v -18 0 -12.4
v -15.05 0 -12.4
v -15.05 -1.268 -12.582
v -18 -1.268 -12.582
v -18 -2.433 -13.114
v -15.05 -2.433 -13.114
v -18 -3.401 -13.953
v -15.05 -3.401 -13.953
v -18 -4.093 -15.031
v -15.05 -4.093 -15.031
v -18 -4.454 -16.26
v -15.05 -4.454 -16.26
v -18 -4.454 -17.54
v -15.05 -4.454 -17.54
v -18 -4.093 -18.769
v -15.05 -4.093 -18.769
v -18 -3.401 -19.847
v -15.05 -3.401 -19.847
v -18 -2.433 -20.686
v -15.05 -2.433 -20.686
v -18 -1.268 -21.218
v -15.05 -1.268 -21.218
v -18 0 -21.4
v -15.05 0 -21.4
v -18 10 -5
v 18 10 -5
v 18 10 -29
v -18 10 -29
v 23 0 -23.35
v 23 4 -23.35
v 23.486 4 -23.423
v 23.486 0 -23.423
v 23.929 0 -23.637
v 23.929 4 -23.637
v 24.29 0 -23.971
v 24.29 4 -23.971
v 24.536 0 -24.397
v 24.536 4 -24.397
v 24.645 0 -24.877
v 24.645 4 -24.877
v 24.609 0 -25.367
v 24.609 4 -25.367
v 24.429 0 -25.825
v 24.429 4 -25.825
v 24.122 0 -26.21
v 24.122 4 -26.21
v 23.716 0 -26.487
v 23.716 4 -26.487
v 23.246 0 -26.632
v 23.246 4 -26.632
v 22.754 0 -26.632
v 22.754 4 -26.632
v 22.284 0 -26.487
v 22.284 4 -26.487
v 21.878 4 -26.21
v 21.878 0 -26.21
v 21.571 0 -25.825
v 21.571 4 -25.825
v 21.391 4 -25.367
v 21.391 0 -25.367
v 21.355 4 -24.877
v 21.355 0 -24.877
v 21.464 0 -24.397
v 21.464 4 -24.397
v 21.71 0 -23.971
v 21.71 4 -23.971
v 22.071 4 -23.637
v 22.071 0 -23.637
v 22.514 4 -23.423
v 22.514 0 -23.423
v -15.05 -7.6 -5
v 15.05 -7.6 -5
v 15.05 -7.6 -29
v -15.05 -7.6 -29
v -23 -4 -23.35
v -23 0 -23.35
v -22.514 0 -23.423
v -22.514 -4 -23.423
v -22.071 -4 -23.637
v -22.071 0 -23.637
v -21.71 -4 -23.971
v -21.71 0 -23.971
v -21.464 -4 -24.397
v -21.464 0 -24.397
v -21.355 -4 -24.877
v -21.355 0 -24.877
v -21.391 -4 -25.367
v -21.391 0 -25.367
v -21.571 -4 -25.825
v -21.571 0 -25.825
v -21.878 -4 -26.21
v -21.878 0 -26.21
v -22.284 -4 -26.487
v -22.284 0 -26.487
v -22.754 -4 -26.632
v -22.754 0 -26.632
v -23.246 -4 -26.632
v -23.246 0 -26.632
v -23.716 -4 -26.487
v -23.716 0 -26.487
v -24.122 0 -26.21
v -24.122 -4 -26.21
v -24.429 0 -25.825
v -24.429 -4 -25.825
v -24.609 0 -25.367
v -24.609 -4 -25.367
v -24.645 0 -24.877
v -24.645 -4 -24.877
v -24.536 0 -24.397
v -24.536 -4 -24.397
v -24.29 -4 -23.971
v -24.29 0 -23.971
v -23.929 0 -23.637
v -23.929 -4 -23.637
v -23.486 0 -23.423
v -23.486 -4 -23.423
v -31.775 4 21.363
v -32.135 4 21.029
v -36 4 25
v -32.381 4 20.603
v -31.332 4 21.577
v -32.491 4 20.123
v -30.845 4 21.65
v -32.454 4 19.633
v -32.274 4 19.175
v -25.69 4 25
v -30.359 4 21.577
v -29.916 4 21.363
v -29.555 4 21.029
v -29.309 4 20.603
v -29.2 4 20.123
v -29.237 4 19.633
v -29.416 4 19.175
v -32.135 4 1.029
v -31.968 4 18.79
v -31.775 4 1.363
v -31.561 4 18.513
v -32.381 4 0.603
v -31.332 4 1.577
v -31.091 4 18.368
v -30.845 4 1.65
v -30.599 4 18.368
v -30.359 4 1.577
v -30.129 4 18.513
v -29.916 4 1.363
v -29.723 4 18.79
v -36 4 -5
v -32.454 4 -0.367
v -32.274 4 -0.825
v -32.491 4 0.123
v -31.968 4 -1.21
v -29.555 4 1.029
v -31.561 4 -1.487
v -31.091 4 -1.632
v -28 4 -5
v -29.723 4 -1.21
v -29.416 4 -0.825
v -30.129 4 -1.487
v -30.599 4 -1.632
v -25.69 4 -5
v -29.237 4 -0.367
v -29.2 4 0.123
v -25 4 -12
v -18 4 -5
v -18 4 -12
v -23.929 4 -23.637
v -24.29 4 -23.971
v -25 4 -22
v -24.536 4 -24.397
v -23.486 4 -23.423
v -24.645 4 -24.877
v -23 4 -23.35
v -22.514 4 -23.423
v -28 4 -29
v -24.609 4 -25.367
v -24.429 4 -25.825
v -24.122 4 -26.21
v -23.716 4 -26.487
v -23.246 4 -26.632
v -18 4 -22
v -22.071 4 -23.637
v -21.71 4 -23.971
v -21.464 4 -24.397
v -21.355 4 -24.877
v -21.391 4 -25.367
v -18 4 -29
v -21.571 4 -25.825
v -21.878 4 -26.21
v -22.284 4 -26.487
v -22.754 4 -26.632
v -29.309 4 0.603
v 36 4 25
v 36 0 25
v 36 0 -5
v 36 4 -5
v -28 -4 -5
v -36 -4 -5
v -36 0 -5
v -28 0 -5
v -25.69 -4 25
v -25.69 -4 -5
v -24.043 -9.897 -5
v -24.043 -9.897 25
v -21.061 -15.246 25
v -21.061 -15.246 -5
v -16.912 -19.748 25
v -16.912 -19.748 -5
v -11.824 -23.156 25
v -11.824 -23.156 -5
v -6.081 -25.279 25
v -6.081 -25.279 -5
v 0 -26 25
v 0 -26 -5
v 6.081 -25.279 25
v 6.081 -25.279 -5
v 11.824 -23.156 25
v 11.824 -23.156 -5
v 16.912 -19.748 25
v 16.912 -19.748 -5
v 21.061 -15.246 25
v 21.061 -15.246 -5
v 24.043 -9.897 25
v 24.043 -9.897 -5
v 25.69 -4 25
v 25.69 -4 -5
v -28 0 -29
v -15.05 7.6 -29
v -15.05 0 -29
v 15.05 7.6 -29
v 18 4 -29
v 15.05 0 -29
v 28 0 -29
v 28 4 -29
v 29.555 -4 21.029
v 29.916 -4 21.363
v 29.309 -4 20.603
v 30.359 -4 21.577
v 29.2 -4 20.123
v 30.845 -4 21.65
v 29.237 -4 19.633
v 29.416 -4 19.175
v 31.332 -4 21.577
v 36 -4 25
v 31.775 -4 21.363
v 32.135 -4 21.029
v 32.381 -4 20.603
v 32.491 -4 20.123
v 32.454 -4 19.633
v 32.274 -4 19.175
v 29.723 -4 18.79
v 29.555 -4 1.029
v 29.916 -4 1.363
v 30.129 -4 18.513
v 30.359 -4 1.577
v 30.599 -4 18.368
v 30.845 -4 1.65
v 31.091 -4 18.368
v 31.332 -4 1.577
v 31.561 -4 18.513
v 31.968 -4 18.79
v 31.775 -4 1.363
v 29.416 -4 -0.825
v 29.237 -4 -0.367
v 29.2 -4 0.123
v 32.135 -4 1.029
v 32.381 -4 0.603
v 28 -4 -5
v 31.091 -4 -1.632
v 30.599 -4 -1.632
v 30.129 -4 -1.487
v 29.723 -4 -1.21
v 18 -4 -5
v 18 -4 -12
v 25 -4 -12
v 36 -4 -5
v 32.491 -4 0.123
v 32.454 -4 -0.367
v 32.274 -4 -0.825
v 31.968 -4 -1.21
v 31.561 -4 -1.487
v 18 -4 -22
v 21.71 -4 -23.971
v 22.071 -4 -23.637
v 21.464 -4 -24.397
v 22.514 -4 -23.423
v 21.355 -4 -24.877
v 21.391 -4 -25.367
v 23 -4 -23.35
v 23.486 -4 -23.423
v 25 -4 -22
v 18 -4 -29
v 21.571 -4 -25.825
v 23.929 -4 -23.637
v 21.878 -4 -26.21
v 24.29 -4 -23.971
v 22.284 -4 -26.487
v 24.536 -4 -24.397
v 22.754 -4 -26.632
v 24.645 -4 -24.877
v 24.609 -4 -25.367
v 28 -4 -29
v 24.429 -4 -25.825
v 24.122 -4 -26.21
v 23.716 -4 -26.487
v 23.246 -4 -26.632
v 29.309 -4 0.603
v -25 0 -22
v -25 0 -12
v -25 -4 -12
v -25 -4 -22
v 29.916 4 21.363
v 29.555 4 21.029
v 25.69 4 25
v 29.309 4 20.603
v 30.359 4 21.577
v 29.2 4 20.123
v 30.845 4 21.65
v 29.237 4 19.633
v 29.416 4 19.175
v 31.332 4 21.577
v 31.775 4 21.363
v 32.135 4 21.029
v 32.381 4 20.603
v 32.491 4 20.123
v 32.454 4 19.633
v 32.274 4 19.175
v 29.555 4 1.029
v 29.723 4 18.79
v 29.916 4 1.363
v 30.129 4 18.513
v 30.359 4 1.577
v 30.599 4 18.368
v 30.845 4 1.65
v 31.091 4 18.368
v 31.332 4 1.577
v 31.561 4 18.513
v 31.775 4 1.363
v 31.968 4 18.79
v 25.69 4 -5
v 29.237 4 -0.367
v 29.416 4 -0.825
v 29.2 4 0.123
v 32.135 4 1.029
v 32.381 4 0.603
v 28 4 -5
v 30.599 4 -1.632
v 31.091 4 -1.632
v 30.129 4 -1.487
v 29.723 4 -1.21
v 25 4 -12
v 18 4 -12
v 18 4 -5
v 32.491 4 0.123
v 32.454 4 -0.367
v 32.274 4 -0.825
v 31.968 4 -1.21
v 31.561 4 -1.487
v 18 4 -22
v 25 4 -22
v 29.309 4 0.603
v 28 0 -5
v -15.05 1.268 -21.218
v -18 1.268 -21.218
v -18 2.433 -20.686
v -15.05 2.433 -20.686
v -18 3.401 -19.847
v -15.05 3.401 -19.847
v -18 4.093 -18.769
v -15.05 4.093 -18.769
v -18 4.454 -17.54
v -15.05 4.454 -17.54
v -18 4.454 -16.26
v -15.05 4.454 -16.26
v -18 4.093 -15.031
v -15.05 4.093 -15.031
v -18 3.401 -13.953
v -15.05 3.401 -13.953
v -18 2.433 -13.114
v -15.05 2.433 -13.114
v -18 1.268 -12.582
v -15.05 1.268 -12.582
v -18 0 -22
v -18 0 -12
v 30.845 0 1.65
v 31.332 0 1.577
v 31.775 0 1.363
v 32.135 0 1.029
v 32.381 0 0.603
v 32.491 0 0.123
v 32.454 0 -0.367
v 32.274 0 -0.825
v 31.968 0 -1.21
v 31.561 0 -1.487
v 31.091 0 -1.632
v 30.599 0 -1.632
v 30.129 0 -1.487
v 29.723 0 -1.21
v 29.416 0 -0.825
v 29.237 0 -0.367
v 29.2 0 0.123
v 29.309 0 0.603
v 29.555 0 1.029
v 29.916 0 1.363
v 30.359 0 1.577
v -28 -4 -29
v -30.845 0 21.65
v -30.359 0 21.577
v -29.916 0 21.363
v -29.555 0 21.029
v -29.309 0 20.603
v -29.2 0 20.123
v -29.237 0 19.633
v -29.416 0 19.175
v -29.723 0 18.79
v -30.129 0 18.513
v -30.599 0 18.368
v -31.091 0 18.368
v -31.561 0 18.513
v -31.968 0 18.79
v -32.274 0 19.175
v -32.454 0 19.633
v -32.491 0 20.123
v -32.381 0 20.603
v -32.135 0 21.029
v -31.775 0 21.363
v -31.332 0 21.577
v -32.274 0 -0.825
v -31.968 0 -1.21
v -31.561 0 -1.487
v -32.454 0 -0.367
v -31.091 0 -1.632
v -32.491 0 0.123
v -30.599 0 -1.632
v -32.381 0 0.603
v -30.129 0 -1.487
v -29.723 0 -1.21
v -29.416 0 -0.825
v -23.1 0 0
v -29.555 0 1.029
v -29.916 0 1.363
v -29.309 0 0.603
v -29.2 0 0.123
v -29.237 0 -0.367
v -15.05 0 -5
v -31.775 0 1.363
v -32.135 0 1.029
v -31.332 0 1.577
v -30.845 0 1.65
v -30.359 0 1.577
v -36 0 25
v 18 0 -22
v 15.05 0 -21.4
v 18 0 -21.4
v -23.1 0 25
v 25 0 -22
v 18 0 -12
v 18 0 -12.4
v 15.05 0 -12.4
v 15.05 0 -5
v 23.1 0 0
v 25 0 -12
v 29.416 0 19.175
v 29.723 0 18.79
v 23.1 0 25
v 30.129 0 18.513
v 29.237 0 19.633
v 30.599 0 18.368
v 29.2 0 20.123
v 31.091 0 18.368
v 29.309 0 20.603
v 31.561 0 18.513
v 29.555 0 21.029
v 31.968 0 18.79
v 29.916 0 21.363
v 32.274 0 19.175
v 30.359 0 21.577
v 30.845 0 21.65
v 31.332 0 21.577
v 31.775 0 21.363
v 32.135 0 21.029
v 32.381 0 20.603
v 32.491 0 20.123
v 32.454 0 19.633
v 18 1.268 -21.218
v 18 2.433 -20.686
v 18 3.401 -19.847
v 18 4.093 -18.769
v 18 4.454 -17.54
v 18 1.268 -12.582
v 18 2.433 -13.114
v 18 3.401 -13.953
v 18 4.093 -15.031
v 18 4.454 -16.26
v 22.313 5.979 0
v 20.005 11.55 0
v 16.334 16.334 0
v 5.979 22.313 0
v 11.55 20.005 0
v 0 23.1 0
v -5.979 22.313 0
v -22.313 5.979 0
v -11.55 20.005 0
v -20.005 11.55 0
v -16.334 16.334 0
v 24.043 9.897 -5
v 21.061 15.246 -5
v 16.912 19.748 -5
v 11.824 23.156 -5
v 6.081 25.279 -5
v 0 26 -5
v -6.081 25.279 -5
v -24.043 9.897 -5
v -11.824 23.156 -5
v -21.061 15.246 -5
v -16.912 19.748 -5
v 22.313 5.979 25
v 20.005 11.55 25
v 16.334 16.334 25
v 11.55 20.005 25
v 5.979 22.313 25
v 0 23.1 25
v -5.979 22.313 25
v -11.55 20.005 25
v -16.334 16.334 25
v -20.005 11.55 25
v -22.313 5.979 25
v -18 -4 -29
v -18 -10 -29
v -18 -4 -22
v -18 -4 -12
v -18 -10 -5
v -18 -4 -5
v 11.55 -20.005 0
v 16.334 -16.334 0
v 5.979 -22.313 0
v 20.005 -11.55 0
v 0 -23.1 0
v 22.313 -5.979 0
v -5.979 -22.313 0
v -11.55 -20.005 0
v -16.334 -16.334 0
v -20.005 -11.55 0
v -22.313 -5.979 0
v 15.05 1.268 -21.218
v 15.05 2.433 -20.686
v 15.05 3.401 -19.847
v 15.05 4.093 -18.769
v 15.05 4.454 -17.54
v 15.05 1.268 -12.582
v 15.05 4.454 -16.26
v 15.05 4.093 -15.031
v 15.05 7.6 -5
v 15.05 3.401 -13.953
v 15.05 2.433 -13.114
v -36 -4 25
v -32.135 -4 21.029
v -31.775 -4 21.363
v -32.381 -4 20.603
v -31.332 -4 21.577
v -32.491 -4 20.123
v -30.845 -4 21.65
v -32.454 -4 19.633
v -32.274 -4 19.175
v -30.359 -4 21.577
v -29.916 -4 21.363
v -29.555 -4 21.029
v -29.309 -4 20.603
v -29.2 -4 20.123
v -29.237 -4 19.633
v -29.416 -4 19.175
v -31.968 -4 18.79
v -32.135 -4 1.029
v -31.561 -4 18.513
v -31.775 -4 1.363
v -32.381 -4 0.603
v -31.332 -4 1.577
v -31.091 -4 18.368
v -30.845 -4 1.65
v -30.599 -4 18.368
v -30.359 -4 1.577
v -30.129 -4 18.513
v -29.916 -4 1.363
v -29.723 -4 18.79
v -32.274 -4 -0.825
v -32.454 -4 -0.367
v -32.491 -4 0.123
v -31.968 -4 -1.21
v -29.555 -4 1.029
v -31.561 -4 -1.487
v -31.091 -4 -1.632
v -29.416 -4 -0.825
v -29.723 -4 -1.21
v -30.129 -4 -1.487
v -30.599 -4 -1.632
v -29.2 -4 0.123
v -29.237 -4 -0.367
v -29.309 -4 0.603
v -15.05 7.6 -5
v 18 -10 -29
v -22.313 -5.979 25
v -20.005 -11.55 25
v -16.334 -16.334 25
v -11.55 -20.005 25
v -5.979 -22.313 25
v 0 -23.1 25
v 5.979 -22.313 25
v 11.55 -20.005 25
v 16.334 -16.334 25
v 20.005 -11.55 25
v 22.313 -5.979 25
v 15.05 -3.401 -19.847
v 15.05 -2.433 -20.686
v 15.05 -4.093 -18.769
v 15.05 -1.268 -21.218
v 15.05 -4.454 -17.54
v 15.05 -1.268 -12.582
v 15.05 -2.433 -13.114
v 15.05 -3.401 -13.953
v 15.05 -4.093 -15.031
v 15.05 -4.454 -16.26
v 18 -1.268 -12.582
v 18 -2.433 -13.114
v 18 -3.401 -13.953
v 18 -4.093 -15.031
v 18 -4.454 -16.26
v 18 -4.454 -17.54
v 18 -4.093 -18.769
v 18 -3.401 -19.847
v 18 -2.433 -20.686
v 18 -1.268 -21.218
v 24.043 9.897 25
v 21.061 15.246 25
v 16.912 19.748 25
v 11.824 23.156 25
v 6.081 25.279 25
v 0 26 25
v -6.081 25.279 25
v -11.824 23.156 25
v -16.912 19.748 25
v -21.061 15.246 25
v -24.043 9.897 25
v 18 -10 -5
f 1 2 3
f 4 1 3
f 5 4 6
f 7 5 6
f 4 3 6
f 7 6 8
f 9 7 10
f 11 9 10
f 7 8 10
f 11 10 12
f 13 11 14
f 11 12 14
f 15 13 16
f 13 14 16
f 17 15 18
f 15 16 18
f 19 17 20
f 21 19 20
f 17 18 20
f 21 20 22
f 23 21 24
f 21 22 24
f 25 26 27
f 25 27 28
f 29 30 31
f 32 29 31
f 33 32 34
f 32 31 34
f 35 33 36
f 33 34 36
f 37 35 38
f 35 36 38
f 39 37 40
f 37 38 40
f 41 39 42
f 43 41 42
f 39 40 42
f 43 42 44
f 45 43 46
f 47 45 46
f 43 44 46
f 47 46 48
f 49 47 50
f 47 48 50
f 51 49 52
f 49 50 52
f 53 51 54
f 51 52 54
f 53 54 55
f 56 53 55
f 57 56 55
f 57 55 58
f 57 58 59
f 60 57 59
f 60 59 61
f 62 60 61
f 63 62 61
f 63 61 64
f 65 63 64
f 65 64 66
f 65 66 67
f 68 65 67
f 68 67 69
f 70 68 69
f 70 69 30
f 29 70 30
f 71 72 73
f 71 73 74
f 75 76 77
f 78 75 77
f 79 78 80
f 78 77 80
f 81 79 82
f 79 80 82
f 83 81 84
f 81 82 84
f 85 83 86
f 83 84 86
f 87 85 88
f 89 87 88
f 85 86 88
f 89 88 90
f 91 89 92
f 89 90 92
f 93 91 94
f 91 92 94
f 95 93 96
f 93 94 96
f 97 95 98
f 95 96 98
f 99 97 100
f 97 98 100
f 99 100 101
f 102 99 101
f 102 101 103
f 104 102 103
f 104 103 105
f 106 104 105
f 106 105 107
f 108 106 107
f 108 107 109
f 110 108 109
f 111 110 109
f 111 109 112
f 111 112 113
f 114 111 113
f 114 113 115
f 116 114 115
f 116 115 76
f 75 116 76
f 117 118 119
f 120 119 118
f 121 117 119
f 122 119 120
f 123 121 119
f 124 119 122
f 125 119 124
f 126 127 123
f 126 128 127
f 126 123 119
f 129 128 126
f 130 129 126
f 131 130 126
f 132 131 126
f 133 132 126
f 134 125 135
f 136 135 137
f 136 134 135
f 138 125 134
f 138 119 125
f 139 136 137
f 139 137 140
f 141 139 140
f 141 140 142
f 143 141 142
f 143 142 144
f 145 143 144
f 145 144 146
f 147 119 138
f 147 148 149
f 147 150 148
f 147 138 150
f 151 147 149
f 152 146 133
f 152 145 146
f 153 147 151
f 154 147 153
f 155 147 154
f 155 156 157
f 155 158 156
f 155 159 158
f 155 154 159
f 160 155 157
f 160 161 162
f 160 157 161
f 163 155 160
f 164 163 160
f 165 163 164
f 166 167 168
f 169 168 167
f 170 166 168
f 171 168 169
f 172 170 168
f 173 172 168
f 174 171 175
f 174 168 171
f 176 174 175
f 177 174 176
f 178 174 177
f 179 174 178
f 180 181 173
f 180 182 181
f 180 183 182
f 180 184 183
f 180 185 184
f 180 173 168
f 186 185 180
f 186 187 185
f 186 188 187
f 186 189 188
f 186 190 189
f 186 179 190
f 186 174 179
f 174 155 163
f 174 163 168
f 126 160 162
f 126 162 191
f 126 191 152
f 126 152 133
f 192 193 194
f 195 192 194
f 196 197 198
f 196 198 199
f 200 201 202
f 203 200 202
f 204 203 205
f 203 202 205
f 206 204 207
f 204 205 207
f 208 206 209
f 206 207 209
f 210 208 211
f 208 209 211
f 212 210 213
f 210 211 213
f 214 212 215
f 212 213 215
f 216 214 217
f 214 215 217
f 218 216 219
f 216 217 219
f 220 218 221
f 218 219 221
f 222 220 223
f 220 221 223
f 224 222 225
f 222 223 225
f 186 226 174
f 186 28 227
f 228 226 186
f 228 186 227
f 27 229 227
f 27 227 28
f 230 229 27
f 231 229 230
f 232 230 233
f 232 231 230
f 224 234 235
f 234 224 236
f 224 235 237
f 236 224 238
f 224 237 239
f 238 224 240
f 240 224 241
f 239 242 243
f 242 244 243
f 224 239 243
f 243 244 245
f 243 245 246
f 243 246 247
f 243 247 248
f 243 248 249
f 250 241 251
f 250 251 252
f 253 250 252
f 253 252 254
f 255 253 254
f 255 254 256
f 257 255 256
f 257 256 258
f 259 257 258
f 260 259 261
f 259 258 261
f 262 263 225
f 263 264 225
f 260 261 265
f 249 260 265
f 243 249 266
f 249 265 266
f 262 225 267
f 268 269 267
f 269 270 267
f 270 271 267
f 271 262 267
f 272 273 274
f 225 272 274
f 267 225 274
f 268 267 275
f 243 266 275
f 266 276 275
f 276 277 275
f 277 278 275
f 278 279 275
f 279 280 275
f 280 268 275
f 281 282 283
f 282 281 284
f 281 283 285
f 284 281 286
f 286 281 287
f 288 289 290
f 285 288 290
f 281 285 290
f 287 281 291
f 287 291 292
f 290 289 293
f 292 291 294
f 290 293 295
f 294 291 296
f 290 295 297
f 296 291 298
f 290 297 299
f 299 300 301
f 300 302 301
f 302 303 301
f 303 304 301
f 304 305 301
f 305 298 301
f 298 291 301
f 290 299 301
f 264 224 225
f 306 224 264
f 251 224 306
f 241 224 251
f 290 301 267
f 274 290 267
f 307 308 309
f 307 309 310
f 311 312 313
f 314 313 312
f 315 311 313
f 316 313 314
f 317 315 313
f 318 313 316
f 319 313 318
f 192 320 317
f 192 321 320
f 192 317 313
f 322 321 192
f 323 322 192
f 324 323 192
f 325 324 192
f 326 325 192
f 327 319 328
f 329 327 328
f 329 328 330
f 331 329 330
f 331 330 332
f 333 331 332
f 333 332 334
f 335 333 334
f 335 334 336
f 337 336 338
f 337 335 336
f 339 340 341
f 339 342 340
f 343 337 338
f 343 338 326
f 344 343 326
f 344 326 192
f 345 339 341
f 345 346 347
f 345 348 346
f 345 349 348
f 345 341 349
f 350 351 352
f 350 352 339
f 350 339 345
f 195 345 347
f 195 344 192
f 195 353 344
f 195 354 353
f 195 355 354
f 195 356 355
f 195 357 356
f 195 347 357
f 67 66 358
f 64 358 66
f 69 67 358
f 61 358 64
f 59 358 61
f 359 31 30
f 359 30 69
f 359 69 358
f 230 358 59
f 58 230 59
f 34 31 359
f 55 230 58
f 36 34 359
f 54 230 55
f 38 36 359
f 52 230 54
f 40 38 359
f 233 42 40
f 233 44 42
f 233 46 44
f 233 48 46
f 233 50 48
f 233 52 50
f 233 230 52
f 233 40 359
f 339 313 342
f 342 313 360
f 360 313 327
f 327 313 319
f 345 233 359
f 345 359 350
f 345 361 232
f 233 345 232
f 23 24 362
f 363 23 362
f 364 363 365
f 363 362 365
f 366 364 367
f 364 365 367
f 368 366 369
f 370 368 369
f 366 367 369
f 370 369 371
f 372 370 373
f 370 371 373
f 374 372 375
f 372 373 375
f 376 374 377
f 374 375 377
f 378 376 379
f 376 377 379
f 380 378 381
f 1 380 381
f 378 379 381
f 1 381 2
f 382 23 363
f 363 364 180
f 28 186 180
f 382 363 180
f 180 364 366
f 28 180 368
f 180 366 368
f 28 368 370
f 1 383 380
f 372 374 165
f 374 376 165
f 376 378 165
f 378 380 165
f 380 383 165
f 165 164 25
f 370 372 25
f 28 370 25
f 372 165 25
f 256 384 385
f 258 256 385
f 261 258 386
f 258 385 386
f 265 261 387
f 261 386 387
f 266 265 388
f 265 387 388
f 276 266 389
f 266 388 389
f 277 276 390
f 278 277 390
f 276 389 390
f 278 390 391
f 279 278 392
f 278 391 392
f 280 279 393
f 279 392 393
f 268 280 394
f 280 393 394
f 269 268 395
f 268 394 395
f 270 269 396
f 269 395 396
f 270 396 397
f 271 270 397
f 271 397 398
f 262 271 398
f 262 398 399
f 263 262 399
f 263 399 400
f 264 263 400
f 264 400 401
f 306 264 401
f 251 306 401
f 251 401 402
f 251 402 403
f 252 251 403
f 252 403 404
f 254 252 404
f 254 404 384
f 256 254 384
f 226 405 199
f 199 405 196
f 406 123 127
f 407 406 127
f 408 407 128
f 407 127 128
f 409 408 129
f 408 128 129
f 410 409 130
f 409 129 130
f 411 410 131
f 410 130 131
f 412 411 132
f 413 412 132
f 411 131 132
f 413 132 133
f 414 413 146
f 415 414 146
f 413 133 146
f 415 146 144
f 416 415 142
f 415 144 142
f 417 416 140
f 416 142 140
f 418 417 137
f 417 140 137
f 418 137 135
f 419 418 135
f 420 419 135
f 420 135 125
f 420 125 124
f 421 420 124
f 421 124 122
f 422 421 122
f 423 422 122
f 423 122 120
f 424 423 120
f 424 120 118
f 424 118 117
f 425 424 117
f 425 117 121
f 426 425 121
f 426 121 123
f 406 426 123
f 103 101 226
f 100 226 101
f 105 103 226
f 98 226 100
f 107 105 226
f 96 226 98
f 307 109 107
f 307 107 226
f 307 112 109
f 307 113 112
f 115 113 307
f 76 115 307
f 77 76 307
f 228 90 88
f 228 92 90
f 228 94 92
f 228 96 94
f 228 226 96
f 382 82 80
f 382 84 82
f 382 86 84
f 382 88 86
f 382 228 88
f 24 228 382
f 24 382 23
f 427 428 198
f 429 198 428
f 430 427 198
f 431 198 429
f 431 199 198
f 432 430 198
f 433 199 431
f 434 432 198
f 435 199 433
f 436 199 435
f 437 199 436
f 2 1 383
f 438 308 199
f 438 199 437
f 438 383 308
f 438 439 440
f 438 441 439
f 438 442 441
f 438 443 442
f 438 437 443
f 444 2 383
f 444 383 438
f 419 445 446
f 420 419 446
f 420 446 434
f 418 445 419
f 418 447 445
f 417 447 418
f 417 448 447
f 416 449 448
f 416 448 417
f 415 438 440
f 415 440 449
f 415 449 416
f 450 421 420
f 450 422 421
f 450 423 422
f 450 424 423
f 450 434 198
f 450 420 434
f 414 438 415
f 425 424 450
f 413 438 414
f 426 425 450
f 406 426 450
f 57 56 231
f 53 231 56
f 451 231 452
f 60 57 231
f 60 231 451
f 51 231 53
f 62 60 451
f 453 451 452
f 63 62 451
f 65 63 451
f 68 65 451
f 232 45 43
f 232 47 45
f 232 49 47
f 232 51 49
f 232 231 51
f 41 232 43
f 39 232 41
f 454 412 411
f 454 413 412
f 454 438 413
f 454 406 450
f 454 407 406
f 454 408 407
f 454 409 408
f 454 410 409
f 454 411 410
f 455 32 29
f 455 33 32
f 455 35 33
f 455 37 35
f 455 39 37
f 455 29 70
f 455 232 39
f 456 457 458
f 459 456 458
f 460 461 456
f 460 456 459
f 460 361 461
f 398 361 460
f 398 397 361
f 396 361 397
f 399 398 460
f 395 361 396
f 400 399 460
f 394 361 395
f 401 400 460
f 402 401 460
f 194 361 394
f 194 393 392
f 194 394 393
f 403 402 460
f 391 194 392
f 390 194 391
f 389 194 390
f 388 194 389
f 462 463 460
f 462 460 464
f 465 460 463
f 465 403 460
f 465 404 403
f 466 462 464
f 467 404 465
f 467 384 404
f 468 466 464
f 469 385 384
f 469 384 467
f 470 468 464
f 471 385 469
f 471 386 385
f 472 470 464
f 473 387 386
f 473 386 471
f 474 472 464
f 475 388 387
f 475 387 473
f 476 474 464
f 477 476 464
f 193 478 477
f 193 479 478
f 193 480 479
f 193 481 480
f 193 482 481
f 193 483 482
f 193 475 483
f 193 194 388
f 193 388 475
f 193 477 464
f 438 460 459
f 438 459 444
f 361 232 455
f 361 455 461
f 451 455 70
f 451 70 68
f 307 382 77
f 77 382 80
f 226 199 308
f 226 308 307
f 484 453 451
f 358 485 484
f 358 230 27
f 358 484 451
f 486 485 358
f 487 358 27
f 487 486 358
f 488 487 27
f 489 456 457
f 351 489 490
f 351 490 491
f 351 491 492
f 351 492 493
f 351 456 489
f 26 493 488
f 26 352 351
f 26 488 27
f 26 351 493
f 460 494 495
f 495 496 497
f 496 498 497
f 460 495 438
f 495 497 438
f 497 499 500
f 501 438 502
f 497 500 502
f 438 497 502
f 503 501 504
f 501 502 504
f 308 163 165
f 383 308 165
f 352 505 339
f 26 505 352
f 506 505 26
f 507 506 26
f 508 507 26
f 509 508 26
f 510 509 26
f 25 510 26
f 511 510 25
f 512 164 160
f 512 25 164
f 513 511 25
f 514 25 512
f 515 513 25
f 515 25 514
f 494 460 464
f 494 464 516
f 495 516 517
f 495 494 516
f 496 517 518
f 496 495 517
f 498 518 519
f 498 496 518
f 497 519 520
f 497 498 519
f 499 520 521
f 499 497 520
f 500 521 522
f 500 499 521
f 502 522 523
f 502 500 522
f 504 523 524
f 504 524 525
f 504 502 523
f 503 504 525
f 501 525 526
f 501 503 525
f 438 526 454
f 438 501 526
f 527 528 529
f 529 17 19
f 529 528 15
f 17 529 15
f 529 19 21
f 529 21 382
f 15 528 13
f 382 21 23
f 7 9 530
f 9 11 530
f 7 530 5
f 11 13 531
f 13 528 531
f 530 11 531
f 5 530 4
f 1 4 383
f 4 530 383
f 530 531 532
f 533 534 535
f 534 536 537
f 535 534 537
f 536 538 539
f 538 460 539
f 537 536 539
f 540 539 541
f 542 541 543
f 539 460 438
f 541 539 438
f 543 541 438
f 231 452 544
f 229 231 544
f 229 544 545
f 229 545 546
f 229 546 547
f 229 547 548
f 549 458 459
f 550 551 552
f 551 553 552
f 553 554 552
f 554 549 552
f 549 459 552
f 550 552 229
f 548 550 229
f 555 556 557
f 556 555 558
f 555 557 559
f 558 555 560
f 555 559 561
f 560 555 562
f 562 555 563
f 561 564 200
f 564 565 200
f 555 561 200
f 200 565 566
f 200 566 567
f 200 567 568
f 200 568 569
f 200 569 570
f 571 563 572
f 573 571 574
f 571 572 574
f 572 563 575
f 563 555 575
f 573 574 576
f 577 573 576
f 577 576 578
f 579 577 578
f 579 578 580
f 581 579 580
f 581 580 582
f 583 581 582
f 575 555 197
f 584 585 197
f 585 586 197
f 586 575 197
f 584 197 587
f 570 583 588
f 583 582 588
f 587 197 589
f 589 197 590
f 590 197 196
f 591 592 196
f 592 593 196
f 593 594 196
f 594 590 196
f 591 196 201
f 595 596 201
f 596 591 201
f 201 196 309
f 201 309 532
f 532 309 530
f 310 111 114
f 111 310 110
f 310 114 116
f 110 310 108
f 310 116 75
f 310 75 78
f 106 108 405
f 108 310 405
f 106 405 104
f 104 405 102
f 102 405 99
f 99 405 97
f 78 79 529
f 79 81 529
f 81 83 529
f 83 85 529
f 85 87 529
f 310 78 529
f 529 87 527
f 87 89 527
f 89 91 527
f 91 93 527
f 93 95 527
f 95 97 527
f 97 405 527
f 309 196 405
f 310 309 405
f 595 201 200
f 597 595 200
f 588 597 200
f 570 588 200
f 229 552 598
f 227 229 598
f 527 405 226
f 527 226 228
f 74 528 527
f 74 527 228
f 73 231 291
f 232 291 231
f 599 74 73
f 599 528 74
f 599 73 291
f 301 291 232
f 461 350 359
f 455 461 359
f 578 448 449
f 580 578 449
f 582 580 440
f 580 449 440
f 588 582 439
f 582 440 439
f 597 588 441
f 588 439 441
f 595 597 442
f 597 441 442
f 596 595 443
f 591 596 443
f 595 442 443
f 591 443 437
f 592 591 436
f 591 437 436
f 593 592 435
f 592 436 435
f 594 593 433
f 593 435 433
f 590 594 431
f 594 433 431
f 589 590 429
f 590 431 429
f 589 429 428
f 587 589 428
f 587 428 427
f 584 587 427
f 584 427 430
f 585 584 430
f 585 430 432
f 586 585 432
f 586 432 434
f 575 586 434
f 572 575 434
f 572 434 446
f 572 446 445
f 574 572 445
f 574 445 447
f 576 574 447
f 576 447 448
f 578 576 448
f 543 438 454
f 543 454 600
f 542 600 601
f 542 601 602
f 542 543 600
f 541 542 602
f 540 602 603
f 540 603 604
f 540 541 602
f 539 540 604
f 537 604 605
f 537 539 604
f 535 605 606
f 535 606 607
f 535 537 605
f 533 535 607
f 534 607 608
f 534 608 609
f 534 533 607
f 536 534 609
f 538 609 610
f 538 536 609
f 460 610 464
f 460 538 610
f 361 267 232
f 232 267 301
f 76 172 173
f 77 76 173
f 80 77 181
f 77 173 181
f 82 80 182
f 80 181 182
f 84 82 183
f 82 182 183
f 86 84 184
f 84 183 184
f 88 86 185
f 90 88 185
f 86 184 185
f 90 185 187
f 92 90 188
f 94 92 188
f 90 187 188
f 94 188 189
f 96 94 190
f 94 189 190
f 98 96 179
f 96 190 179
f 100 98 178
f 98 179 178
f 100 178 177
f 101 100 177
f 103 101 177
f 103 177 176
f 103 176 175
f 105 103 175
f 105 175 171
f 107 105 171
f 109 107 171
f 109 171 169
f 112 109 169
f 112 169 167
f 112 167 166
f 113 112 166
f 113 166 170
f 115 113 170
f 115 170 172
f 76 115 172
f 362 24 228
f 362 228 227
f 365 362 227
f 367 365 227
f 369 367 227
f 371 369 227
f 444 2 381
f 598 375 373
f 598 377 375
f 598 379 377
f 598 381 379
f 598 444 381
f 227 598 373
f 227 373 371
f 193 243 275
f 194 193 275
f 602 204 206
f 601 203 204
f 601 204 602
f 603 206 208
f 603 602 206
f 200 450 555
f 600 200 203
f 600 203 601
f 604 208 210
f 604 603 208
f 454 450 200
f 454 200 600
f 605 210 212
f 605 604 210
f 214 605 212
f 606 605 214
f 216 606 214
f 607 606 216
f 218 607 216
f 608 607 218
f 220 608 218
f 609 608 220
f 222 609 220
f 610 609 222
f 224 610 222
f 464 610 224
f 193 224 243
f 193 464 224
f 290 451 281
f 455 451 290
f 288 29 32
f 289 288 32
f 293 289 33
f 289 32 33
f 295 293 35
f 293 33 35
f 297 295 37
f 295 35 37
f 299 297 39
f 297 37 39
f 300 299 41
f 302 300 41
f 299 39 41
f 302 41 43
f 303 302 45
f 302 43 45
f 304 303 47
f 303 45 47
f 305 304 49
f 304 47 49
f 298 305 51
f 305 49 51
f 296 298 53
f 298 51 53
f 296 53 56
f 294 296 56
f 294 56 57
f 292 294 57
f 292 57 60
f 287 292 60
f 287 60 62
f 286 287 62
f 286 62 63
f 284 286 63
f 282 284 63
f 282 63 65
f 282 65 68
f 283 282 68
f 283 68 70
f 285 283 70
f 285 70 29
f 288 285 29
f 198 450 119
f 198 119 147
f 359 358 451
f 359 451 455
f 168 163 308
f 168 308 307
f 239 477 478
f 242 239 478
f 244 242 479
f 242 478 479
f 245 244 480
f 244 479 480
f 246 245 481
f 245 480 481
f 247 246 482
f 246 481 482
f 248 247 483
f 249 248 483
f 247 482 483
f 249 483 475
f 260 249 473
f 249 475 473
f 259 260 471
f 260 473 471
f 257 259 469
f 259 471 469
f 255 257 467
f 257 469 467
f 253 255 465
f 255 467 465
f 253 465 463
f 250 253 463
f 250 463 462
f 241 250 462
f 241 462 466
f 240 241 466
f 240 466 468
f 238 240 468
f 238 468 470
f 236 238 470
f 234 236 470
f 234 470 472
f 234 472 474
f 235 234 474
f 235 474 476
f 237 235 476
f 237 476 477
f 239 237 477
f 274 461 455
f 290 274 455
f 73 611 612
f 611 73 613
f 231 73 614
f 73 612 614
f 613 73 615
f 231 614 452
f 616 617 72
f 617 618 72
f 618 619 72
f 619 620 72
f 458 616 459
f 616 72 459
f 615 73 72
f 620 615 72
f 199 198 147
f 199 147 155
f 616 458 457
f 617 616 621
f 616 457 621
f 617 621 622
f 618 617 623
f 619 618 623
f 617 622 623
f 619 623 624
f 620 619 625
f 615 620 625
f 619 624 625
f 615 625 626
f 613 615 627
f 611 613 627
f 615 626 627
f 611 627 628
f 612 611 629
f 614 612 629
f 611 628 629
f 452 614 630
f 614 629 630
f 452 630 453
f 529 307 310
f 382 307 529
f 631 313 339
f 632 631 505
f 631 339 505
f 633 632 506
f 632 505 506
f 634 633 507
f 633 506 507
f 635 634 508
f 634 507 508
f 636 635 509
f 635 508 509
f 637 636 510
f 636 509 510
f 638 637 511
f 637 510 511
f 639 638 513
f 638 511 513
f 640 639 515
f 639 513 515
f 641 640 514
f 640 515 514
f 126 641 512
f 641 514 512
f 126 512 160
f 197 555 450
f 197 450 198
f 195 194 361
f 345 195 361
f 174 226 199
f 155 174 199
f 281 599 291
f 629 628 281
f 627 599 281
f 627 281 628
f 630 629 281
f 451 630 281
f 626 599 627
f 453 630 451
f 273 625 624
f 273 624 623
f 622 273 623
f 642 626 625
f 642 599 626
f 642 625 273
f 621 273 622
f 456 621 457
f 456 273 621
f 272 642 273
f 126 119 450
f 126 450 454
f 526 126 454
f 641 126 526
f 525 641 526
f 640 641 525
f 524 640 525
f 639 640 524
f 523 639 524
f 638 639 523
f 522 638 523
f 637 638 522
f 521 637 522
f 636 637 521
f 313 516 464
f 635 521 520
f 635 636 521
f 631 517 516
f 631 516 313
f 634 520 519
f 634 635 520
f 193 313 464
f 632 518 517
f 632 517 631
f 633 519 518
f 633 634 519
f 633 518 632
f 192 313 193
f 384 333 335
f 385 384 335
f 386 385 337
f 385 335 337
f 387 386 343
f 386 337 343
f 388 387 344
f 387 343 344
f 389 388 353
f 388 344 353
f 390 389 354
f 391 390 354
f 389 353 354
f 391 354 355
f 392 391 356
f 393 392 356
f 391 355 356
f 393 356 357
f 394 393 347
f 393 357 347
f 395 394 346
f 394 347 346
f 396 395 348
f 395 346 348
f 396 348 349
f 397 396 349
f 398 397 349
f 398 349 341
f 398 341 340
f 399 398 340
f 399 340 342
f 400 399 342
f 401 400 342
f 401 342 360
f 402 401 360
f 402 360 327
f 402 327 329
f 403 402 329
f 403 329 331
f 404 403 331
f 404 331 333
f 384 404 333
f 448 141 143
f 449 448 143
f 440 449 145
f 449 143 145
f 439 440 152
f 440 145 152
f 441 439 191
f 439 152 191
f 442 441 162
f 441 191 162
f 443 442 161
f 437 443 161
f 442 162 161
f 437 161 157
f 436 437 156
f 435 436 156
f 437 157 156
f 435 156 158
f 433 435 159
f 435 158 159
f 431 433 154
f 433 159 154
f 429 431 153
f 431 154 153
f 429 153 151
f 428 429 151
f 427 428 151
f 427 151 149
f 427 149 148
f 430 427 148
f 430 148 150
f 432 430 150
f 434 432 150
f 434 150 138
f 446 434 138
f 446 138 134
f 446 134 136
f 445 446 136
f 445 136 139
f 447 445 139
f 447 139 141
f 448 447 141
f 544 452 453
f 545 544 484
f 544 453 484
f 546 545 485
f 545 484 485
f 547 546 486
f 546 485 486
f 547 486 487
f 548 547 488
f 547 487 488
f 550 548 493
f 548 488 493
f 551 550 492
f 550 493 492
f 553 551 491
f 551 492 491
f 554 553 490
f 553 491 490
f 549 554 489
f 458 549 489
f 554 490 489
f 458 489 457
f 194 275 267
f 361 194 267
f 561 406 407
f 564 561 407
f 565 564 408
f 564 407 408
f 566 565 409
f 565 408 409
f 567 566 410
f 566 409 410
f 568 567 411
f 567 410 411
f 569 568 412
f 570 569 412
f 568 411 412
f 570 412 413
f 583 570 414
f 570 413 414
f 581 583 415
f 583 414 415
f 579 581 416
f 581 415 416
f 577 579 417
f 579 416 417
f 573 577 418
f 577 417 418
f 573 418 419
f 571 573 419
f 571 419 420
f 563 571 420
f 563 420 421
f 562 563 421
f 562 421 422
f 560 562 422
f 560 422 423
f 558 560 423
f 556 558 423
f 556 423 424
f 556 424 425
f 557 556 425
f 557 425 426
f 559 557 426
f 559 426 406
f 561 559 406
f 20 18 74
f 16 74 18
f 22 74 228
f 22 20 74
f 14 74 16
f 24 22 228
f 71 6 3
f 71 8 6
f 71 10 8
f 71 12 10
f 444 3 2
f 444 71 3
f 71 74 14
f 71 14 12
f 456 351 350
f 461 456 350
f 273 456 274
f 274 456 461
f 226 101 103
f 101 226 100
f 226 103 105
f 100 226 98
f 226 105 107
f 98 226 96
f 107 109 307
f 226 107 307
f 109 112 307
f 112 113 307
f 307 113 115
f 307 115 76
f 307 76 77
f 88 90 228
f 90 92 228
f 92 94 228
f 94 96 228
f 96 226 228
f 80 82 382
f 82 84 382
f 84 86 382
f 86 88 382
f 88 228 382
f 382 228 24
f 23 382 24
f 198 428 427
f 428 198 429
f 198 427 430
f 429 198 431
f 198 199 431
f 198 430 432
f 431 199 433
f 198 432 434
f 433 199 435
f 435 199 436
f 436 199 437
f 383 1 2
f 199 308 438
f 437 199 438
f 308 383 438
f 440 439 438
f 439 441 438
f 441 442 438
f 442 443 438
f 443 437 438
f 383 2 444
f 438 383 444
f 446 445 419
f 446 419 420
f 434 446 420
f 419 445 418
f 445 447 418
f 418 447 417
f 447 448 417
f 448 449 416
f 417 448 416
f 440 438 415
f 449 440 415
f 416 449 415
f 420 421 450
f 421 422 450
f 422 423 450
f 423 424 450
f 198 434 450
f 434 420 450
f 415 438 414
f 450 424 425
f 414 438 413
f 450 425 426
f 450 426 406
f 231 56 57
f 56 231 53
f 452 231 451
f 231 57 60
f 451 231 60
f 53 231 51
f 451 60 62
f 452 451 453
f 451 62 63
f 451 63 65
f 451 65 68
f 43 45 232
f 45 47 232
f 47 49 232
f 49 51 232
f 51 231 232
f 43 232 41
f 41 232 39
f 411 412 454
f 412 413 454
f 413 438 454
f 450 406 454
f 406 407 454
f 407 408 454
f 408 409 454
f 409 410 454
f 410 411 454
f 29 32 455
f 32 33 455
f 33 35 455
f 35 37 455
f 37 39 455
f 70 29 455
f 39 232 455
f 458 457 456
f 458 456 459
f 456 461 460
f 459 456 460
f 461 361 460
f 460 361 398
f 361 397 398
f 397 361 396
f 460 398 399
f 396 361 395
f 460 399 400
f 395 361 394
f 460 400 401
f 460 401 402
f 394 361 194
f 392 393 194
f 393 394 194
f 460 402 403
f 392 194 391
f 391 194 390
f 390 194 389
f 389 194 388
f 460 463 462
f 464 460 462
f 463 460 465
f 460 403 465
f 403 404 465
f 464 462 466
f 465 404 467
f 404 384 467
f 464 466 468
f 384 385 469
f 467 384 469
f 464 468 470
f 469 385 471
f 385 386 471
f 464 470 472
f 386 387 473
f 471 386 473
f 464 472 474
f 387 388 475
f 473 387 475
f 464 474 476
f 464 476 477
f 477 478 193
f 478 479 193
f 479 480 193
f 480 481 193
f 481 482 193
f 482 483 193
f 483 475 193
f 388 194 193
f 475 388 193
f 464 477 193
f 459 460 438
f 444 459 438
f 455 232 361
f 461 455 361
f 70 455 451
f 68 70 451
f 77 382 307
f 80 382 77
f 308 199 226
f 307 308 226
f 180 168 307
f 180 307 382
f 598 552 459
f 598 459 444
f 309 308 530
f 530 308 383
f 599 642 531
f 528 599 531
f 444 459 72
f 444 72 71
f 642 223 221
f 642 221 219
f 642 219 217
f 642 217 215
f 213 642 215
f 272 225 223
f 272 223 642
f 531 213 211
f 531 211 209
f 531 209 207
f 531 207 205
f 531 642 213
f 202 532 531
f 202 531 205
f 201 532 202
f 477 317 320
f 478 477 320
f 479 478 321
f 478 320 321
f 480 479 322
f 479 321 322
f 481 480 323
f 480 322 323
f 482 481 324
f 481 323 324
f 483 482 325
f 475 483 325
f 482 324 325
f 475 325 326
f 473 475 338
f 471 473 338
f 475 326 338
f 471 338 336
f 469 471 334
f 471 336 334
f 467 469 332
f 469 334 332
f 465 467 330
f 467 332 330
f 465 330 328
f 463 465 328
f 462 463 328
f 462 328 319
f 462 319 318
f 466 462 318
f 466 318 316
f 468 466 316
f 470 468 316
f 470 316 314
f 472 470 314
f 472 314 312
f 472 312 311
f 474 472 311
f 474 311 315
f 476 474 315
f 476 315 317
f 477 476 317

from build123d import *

# Parameters (mm, degrees)
SKETCH_1_R           = 26
SKETCH_1_R_2         = 23.1
EXTRUDE_1_DEPTH      = 25
EXTRUDE_START        = 5
SKETCH_2_R           = 26
EXTRUDE_2_DEPTH      = 5
SKETCH_3_W           = 36
SKETCH_3_H           = 20
SKETCH_3_W_2         = 30.1
SKETCH_3_H_2         = 15.2
EXTRUDE_3_DEPTH      = 24
CUT_EXTRUDE_1_REACH  = 60.762
SKETCH_4_R           = 4.5
EXTRUDE_4_DEPTH      = 4
EXTRUDE_4_DEPTH_BACK = 4
SKETCH_5_W           = 10
SKETCH_5_H           = 24
SKETCH_5_W_2         = 11
SKETCH_5_H_2         = 30
CUT_EXTRUDE_2_REACH  = 57.109
SKETCH_6_R           = 1.65
SKETCH_6_W           = 7
SKETCH_6_H           = 10


with BuildPart() as part:
    # ｽｹｯﾁ1 → ﾎﾞｽ - 押し出し1 (new body)
    with BuildSketch(Plane.XY):
        Circle(SKETCH_1_R)
        Circle(SKETCH_1_R_2, mode=Mode.SUBTRACT)
    extrude(amount=EXTRUDE_1_DEPTH)

    # ｽｹｯﾁ2 → ﾎﾞｽ - 押し出し2 (add)
    with BuildSketch(Plane(origin=(0, 0, 0), x_dir=(-1, 0, 0), z_dir=(0, 0, -1)).offset(EXTRUDE_START)):
        Circle(SKETCH_2_R)
    extrude(amount=-EXTRUDE_2_DEPTH)

    # ｽｹｯﾁ3 → ﾎﾞｽ - 押し出し3 (add)
    with BuildSketch(Plane(origin=(0, 0, -5), x_dir=(-1, 0, 0), z_dir=(0, 0, -1))):
        Rectangle(SKETCH_3_W, SKETCH_3_H)
        Rectangle(SKETCH_3_W_2, SKETCH_3_H_2, mode=Mode.SUBTRACT)
    extrude(amount=EXTRUDE_3_DEPTH)

    # ｶｯﾄ - 押し出し1: up to this face of the body (flat: up to its plane)
    cut_extrude_1_end = Plane(part.part.faces().sort_by_distance((-18, 0, -17))[0])
    # ｽｹｯﾁ4 → ｶｯﾄ - 押し出し1 (cut, up to the picked face)
    with BuildSketch(Plane(origin=(18, 0, 0), x_dir=(0, 0, -1), z_dir=(1, 0, 0)), mode=Mode.PRIVATE) as cut_extrude_1_sk1:
        with Locations((16.9, 0)):
            Circle(SKETCH_4_R)
    cut_extrude_1_tool1 = split(extrude(cut_extrude_1_sk1.sketch, amount=-CUT_EXTRUDE_1_REACH, mode=Mode.PRIVATE), bisect_by=cut_extrude_1_end, keep=Keep.BOTH, mode=Mode.PRIVATE)
    add(cut_extrude_1_tool1.solids().sort_by(Axis((18, 0, -16.9), (-1, 0, 0)))[0], mode=Mode.SUBTRACT)

    # ｽｹｯﾁ5 → ﾎﾞｽ - 押し出し4 (add, two sides: drawn at the far end of the back side and taken through both)
    with BuildSketch(Plane(origin=(0, 0, 0), x_dir=(1, 0, 0), z_dir=(0, 1, 0)).offset(-EXTRUDE_4_DEPTH_BACK)):
        Polygon((28, 5), (25, 5), (25, -25), (36, -25), (36, 5), align=None)
        with Locations((23, 17)):
            Rectangle(SKETCH_5_W, SKETCH_5_H)
        Polygon((-28, 29), (-28, 5), (-25, 5), (-18, 5), (-18, 29), align=None)
        with Locations((-30.5, -10)):
            Rectangle(SKETCH_5_W_2, SKETCH_5_H_2)
    extrude(amount=EXTRUDE_4_DEPTH + EXTRUDE_4_DEPTH_BACK)

    # ｽｹｯﾁ6 → ｶｯﾄ - 押し出し2 (cut, up to next)
    with BuildSketch(Plane(origin=(0, 4, 0), x_dir=(1, 0, 0), z_dir=(0, 1, 0)), mode=Mode.PRIVATE) as cut_extrude_2_sk1:
        with Locations(Location((23, 25, 0), (0, 0, 270))):
            Circle(SKETCH_6_R)
    cut_extrude_2_tool1 = extrude(cut_extrude_2_sk1.sketch, amount=-CUT_EXTRUDE_2_REACH, mode=Mode.PRIVATE) & part.part
    # ｽｹｯﾁ6 → ｶｯﾄ - 押し出し2 (cut, up to next)
    with BuildSketch(Plane(origin=(0, 4, 0), x_dir=(1, 0, 0), z_dir=(0, 1, 0)), mode=Mode.PRIVATE) as cut_extrude_2_sk2:
        with Locations(Location((30.845232579, 0, 0), (0, 0, 270))):
            Circle(SKETCH_6_R)
    cut_extrude_2_tool2 = extrude(cut_extrude_2_sk2.sketch, amount=-CUT_EXTRUDE_2_REACH, mode=Mode.PRIVATE) & part.part
    # ｽｹｯﾁ6 → ｶｯﾄ - 押し出し2 (cut, up to next)
    with BuildSketch(Plane(origin=(0, 4, 0), x_dir=(1, 0, 0), z_dir=(0, 1, 0)), mode=Mode.PRIVATE) as cut_extrude_2_sk3:
        with Locations(Location((30.845232579, -20, 0), (0, 0, 270))):
            Circle(SKETCH_6_R)
    cut_extrude_2_tool3 = extrude(cut_extrude_2_sk3.sketch, amount=-CUT_EXTRUDE_2_REACH, mode=Mode.PRIVATE) & part.part
    # ｽｹｯﾁ6 → ｶｯﾄ - 押し出し2 (cut, up to next)
    with BuildSketch(Plane(origin=(0, 4, 0), x_dir=(1, 0, 0), z_dir=(0, 1, 0)), mode=Mode.PRIVATE) as cut_extrude_2_sk4:
        with Locations(Location((-30.845232579, -20, 0), (0, 0, 270))):
            Circle(SKETCH_6_R)
    cut_extrude_2_tool4 = extrude(cut_extrude_2_sk4.sketch, amount=-CUT_EXTRUDE_2_REACH, mode=Mode.PRIVATE) & part.part
    # ｽｹｯﾁ6 → ｶｯﾄ - 押し出し2 (cut, up to next)
    with BuildSketch(Plane(origin=(0, 4, 0), x_dir=(1, 0, 0), z_dir=(0, 1, 0)), mode=Mode.PRIVATE) as cut_extrude_2_sk5:
        with Locations(Location((-30.845232579, 0, 0), (0, 0, 270))):
            Circle(SKETCH_6_R)
    cut_extrude_2_tool5 = extrude(cut_extrude_2_sk5.sketch, amount=-CUT_EXTRUDE_2_REACH, mode=Mode.PRIVATE) & part.part
    # ｽｹｯﾁ6 → ｶｯﾄ - 押し出し2 (cut, up to next)
    with BuildSketch(Plane(origin=(0, 4, 0), x_dir=(1, 0, 0), z_dir=(0, 1, 0)), mode=Mode.PRIVATE) as cut_extrude_2_sk6:
        with Locations(Location((-23, 25, 0), (0, 0, 270))):
            Circle(SKETCH_6_R)
    cut_extrude_2_tool6 = extrude(cut_extrude_2_sk6.sketch, amount=-CUT_EXTRUDE_2_REACH, mode=Mode.PRIVATE) & part.part
    # ｽｹｯﾁ6 → ｶｯﾄ - 押し出し2 (cut, up to next)
    with BuildSketch(Plane(origin=(0, 4, 0), x_dir=(1, 0, 0), z_dir=(0, 1, 0)), mode=Mode.PRIVATE) as cut_extrude_2_sk7:
        with Locations((21.5, 17)):
            Rectangle(SKETCH_6_W, SKETCH_6_H)
    cut_extrude_2_tool7 = extrude(cut_extrude_2_sk7.sketch, amount=-CUT_EXTRUDE_2_REACH, mode=Mode.PRIVATE) & part.part
    # ｽｹｯﾁ6 → ｶｯﾄ - 押し出し2 (cut, up to next)
    with BuildSketch(Plane(origin=(0, 4, 0), x_dir=(1, 0, 0), z_dir=(0, 1, 0)), mode=Mode.PRIVATE) as cut_extrude_2_sk8:
        with Locations((-21.5, 17)):
            Rectangle(SKETCH_6_W, SKETCH_6_H)
    cut_extrude_2_tool8 = extrude(cut_extrude_2_sk8.sketch, amount=-CUT_EXTRUDE_2_REACH, mode=Mode.PRIVATE) & part.part
    add(cut_extrude_2_tool1.solids().sort_by_distance((23, 4, -25))[0], mode=Mode.SUBTRACT)
    add(cut_extrude_2_tool2.solids().sort_by_distance((30.845233, 4, 0))[0], mode=Mode.SUBTRACT)
    add(cut_extrude_2_tool3.solids().sort_by_distance((30.845233, 4, 20))[0], mode=Mode.SUBTRACT)
    add(cut_extrude_2_tool4.solids().sort_by_distance((-30.845233, 4, 20))[0], mode=Mode.SUBTRACT)
    add(cut_extrude_2_tool5.solids().sort_by_distance((-30.845233, 4, 0))[0], mode=Mode.SUBTRACT)
    add(cut_extrude_2_tool6.solids().sort_by_distance((-23, 4, -25))[0], mode=Mode.SUBTRACT)
    add(cut_extrude_2_tool7.solids().sort_by_distance((21.5, 4, -17))[0], mode=Mode.SUBTRACT)
    add(cut_extrude_2_tool8.solids().sort_by_distance((-21.5, 4, -17))[0], mode=Mode.SUBTRACT)


with BuildPart() as body_2:
    # Split Bodies 1: the piece on the far side of the plane
    add(part.part)
    split(bisect_by=Plane.ZX, keep=Keep.BOTTOM)


with BuildPart() as part_1:
    add(part.part)

    # Split Bodies 1
    split(bisect_by=Plane.ZX, keep=Keep.TOP)


solid = Compound([body_2.part, part_1.part])
